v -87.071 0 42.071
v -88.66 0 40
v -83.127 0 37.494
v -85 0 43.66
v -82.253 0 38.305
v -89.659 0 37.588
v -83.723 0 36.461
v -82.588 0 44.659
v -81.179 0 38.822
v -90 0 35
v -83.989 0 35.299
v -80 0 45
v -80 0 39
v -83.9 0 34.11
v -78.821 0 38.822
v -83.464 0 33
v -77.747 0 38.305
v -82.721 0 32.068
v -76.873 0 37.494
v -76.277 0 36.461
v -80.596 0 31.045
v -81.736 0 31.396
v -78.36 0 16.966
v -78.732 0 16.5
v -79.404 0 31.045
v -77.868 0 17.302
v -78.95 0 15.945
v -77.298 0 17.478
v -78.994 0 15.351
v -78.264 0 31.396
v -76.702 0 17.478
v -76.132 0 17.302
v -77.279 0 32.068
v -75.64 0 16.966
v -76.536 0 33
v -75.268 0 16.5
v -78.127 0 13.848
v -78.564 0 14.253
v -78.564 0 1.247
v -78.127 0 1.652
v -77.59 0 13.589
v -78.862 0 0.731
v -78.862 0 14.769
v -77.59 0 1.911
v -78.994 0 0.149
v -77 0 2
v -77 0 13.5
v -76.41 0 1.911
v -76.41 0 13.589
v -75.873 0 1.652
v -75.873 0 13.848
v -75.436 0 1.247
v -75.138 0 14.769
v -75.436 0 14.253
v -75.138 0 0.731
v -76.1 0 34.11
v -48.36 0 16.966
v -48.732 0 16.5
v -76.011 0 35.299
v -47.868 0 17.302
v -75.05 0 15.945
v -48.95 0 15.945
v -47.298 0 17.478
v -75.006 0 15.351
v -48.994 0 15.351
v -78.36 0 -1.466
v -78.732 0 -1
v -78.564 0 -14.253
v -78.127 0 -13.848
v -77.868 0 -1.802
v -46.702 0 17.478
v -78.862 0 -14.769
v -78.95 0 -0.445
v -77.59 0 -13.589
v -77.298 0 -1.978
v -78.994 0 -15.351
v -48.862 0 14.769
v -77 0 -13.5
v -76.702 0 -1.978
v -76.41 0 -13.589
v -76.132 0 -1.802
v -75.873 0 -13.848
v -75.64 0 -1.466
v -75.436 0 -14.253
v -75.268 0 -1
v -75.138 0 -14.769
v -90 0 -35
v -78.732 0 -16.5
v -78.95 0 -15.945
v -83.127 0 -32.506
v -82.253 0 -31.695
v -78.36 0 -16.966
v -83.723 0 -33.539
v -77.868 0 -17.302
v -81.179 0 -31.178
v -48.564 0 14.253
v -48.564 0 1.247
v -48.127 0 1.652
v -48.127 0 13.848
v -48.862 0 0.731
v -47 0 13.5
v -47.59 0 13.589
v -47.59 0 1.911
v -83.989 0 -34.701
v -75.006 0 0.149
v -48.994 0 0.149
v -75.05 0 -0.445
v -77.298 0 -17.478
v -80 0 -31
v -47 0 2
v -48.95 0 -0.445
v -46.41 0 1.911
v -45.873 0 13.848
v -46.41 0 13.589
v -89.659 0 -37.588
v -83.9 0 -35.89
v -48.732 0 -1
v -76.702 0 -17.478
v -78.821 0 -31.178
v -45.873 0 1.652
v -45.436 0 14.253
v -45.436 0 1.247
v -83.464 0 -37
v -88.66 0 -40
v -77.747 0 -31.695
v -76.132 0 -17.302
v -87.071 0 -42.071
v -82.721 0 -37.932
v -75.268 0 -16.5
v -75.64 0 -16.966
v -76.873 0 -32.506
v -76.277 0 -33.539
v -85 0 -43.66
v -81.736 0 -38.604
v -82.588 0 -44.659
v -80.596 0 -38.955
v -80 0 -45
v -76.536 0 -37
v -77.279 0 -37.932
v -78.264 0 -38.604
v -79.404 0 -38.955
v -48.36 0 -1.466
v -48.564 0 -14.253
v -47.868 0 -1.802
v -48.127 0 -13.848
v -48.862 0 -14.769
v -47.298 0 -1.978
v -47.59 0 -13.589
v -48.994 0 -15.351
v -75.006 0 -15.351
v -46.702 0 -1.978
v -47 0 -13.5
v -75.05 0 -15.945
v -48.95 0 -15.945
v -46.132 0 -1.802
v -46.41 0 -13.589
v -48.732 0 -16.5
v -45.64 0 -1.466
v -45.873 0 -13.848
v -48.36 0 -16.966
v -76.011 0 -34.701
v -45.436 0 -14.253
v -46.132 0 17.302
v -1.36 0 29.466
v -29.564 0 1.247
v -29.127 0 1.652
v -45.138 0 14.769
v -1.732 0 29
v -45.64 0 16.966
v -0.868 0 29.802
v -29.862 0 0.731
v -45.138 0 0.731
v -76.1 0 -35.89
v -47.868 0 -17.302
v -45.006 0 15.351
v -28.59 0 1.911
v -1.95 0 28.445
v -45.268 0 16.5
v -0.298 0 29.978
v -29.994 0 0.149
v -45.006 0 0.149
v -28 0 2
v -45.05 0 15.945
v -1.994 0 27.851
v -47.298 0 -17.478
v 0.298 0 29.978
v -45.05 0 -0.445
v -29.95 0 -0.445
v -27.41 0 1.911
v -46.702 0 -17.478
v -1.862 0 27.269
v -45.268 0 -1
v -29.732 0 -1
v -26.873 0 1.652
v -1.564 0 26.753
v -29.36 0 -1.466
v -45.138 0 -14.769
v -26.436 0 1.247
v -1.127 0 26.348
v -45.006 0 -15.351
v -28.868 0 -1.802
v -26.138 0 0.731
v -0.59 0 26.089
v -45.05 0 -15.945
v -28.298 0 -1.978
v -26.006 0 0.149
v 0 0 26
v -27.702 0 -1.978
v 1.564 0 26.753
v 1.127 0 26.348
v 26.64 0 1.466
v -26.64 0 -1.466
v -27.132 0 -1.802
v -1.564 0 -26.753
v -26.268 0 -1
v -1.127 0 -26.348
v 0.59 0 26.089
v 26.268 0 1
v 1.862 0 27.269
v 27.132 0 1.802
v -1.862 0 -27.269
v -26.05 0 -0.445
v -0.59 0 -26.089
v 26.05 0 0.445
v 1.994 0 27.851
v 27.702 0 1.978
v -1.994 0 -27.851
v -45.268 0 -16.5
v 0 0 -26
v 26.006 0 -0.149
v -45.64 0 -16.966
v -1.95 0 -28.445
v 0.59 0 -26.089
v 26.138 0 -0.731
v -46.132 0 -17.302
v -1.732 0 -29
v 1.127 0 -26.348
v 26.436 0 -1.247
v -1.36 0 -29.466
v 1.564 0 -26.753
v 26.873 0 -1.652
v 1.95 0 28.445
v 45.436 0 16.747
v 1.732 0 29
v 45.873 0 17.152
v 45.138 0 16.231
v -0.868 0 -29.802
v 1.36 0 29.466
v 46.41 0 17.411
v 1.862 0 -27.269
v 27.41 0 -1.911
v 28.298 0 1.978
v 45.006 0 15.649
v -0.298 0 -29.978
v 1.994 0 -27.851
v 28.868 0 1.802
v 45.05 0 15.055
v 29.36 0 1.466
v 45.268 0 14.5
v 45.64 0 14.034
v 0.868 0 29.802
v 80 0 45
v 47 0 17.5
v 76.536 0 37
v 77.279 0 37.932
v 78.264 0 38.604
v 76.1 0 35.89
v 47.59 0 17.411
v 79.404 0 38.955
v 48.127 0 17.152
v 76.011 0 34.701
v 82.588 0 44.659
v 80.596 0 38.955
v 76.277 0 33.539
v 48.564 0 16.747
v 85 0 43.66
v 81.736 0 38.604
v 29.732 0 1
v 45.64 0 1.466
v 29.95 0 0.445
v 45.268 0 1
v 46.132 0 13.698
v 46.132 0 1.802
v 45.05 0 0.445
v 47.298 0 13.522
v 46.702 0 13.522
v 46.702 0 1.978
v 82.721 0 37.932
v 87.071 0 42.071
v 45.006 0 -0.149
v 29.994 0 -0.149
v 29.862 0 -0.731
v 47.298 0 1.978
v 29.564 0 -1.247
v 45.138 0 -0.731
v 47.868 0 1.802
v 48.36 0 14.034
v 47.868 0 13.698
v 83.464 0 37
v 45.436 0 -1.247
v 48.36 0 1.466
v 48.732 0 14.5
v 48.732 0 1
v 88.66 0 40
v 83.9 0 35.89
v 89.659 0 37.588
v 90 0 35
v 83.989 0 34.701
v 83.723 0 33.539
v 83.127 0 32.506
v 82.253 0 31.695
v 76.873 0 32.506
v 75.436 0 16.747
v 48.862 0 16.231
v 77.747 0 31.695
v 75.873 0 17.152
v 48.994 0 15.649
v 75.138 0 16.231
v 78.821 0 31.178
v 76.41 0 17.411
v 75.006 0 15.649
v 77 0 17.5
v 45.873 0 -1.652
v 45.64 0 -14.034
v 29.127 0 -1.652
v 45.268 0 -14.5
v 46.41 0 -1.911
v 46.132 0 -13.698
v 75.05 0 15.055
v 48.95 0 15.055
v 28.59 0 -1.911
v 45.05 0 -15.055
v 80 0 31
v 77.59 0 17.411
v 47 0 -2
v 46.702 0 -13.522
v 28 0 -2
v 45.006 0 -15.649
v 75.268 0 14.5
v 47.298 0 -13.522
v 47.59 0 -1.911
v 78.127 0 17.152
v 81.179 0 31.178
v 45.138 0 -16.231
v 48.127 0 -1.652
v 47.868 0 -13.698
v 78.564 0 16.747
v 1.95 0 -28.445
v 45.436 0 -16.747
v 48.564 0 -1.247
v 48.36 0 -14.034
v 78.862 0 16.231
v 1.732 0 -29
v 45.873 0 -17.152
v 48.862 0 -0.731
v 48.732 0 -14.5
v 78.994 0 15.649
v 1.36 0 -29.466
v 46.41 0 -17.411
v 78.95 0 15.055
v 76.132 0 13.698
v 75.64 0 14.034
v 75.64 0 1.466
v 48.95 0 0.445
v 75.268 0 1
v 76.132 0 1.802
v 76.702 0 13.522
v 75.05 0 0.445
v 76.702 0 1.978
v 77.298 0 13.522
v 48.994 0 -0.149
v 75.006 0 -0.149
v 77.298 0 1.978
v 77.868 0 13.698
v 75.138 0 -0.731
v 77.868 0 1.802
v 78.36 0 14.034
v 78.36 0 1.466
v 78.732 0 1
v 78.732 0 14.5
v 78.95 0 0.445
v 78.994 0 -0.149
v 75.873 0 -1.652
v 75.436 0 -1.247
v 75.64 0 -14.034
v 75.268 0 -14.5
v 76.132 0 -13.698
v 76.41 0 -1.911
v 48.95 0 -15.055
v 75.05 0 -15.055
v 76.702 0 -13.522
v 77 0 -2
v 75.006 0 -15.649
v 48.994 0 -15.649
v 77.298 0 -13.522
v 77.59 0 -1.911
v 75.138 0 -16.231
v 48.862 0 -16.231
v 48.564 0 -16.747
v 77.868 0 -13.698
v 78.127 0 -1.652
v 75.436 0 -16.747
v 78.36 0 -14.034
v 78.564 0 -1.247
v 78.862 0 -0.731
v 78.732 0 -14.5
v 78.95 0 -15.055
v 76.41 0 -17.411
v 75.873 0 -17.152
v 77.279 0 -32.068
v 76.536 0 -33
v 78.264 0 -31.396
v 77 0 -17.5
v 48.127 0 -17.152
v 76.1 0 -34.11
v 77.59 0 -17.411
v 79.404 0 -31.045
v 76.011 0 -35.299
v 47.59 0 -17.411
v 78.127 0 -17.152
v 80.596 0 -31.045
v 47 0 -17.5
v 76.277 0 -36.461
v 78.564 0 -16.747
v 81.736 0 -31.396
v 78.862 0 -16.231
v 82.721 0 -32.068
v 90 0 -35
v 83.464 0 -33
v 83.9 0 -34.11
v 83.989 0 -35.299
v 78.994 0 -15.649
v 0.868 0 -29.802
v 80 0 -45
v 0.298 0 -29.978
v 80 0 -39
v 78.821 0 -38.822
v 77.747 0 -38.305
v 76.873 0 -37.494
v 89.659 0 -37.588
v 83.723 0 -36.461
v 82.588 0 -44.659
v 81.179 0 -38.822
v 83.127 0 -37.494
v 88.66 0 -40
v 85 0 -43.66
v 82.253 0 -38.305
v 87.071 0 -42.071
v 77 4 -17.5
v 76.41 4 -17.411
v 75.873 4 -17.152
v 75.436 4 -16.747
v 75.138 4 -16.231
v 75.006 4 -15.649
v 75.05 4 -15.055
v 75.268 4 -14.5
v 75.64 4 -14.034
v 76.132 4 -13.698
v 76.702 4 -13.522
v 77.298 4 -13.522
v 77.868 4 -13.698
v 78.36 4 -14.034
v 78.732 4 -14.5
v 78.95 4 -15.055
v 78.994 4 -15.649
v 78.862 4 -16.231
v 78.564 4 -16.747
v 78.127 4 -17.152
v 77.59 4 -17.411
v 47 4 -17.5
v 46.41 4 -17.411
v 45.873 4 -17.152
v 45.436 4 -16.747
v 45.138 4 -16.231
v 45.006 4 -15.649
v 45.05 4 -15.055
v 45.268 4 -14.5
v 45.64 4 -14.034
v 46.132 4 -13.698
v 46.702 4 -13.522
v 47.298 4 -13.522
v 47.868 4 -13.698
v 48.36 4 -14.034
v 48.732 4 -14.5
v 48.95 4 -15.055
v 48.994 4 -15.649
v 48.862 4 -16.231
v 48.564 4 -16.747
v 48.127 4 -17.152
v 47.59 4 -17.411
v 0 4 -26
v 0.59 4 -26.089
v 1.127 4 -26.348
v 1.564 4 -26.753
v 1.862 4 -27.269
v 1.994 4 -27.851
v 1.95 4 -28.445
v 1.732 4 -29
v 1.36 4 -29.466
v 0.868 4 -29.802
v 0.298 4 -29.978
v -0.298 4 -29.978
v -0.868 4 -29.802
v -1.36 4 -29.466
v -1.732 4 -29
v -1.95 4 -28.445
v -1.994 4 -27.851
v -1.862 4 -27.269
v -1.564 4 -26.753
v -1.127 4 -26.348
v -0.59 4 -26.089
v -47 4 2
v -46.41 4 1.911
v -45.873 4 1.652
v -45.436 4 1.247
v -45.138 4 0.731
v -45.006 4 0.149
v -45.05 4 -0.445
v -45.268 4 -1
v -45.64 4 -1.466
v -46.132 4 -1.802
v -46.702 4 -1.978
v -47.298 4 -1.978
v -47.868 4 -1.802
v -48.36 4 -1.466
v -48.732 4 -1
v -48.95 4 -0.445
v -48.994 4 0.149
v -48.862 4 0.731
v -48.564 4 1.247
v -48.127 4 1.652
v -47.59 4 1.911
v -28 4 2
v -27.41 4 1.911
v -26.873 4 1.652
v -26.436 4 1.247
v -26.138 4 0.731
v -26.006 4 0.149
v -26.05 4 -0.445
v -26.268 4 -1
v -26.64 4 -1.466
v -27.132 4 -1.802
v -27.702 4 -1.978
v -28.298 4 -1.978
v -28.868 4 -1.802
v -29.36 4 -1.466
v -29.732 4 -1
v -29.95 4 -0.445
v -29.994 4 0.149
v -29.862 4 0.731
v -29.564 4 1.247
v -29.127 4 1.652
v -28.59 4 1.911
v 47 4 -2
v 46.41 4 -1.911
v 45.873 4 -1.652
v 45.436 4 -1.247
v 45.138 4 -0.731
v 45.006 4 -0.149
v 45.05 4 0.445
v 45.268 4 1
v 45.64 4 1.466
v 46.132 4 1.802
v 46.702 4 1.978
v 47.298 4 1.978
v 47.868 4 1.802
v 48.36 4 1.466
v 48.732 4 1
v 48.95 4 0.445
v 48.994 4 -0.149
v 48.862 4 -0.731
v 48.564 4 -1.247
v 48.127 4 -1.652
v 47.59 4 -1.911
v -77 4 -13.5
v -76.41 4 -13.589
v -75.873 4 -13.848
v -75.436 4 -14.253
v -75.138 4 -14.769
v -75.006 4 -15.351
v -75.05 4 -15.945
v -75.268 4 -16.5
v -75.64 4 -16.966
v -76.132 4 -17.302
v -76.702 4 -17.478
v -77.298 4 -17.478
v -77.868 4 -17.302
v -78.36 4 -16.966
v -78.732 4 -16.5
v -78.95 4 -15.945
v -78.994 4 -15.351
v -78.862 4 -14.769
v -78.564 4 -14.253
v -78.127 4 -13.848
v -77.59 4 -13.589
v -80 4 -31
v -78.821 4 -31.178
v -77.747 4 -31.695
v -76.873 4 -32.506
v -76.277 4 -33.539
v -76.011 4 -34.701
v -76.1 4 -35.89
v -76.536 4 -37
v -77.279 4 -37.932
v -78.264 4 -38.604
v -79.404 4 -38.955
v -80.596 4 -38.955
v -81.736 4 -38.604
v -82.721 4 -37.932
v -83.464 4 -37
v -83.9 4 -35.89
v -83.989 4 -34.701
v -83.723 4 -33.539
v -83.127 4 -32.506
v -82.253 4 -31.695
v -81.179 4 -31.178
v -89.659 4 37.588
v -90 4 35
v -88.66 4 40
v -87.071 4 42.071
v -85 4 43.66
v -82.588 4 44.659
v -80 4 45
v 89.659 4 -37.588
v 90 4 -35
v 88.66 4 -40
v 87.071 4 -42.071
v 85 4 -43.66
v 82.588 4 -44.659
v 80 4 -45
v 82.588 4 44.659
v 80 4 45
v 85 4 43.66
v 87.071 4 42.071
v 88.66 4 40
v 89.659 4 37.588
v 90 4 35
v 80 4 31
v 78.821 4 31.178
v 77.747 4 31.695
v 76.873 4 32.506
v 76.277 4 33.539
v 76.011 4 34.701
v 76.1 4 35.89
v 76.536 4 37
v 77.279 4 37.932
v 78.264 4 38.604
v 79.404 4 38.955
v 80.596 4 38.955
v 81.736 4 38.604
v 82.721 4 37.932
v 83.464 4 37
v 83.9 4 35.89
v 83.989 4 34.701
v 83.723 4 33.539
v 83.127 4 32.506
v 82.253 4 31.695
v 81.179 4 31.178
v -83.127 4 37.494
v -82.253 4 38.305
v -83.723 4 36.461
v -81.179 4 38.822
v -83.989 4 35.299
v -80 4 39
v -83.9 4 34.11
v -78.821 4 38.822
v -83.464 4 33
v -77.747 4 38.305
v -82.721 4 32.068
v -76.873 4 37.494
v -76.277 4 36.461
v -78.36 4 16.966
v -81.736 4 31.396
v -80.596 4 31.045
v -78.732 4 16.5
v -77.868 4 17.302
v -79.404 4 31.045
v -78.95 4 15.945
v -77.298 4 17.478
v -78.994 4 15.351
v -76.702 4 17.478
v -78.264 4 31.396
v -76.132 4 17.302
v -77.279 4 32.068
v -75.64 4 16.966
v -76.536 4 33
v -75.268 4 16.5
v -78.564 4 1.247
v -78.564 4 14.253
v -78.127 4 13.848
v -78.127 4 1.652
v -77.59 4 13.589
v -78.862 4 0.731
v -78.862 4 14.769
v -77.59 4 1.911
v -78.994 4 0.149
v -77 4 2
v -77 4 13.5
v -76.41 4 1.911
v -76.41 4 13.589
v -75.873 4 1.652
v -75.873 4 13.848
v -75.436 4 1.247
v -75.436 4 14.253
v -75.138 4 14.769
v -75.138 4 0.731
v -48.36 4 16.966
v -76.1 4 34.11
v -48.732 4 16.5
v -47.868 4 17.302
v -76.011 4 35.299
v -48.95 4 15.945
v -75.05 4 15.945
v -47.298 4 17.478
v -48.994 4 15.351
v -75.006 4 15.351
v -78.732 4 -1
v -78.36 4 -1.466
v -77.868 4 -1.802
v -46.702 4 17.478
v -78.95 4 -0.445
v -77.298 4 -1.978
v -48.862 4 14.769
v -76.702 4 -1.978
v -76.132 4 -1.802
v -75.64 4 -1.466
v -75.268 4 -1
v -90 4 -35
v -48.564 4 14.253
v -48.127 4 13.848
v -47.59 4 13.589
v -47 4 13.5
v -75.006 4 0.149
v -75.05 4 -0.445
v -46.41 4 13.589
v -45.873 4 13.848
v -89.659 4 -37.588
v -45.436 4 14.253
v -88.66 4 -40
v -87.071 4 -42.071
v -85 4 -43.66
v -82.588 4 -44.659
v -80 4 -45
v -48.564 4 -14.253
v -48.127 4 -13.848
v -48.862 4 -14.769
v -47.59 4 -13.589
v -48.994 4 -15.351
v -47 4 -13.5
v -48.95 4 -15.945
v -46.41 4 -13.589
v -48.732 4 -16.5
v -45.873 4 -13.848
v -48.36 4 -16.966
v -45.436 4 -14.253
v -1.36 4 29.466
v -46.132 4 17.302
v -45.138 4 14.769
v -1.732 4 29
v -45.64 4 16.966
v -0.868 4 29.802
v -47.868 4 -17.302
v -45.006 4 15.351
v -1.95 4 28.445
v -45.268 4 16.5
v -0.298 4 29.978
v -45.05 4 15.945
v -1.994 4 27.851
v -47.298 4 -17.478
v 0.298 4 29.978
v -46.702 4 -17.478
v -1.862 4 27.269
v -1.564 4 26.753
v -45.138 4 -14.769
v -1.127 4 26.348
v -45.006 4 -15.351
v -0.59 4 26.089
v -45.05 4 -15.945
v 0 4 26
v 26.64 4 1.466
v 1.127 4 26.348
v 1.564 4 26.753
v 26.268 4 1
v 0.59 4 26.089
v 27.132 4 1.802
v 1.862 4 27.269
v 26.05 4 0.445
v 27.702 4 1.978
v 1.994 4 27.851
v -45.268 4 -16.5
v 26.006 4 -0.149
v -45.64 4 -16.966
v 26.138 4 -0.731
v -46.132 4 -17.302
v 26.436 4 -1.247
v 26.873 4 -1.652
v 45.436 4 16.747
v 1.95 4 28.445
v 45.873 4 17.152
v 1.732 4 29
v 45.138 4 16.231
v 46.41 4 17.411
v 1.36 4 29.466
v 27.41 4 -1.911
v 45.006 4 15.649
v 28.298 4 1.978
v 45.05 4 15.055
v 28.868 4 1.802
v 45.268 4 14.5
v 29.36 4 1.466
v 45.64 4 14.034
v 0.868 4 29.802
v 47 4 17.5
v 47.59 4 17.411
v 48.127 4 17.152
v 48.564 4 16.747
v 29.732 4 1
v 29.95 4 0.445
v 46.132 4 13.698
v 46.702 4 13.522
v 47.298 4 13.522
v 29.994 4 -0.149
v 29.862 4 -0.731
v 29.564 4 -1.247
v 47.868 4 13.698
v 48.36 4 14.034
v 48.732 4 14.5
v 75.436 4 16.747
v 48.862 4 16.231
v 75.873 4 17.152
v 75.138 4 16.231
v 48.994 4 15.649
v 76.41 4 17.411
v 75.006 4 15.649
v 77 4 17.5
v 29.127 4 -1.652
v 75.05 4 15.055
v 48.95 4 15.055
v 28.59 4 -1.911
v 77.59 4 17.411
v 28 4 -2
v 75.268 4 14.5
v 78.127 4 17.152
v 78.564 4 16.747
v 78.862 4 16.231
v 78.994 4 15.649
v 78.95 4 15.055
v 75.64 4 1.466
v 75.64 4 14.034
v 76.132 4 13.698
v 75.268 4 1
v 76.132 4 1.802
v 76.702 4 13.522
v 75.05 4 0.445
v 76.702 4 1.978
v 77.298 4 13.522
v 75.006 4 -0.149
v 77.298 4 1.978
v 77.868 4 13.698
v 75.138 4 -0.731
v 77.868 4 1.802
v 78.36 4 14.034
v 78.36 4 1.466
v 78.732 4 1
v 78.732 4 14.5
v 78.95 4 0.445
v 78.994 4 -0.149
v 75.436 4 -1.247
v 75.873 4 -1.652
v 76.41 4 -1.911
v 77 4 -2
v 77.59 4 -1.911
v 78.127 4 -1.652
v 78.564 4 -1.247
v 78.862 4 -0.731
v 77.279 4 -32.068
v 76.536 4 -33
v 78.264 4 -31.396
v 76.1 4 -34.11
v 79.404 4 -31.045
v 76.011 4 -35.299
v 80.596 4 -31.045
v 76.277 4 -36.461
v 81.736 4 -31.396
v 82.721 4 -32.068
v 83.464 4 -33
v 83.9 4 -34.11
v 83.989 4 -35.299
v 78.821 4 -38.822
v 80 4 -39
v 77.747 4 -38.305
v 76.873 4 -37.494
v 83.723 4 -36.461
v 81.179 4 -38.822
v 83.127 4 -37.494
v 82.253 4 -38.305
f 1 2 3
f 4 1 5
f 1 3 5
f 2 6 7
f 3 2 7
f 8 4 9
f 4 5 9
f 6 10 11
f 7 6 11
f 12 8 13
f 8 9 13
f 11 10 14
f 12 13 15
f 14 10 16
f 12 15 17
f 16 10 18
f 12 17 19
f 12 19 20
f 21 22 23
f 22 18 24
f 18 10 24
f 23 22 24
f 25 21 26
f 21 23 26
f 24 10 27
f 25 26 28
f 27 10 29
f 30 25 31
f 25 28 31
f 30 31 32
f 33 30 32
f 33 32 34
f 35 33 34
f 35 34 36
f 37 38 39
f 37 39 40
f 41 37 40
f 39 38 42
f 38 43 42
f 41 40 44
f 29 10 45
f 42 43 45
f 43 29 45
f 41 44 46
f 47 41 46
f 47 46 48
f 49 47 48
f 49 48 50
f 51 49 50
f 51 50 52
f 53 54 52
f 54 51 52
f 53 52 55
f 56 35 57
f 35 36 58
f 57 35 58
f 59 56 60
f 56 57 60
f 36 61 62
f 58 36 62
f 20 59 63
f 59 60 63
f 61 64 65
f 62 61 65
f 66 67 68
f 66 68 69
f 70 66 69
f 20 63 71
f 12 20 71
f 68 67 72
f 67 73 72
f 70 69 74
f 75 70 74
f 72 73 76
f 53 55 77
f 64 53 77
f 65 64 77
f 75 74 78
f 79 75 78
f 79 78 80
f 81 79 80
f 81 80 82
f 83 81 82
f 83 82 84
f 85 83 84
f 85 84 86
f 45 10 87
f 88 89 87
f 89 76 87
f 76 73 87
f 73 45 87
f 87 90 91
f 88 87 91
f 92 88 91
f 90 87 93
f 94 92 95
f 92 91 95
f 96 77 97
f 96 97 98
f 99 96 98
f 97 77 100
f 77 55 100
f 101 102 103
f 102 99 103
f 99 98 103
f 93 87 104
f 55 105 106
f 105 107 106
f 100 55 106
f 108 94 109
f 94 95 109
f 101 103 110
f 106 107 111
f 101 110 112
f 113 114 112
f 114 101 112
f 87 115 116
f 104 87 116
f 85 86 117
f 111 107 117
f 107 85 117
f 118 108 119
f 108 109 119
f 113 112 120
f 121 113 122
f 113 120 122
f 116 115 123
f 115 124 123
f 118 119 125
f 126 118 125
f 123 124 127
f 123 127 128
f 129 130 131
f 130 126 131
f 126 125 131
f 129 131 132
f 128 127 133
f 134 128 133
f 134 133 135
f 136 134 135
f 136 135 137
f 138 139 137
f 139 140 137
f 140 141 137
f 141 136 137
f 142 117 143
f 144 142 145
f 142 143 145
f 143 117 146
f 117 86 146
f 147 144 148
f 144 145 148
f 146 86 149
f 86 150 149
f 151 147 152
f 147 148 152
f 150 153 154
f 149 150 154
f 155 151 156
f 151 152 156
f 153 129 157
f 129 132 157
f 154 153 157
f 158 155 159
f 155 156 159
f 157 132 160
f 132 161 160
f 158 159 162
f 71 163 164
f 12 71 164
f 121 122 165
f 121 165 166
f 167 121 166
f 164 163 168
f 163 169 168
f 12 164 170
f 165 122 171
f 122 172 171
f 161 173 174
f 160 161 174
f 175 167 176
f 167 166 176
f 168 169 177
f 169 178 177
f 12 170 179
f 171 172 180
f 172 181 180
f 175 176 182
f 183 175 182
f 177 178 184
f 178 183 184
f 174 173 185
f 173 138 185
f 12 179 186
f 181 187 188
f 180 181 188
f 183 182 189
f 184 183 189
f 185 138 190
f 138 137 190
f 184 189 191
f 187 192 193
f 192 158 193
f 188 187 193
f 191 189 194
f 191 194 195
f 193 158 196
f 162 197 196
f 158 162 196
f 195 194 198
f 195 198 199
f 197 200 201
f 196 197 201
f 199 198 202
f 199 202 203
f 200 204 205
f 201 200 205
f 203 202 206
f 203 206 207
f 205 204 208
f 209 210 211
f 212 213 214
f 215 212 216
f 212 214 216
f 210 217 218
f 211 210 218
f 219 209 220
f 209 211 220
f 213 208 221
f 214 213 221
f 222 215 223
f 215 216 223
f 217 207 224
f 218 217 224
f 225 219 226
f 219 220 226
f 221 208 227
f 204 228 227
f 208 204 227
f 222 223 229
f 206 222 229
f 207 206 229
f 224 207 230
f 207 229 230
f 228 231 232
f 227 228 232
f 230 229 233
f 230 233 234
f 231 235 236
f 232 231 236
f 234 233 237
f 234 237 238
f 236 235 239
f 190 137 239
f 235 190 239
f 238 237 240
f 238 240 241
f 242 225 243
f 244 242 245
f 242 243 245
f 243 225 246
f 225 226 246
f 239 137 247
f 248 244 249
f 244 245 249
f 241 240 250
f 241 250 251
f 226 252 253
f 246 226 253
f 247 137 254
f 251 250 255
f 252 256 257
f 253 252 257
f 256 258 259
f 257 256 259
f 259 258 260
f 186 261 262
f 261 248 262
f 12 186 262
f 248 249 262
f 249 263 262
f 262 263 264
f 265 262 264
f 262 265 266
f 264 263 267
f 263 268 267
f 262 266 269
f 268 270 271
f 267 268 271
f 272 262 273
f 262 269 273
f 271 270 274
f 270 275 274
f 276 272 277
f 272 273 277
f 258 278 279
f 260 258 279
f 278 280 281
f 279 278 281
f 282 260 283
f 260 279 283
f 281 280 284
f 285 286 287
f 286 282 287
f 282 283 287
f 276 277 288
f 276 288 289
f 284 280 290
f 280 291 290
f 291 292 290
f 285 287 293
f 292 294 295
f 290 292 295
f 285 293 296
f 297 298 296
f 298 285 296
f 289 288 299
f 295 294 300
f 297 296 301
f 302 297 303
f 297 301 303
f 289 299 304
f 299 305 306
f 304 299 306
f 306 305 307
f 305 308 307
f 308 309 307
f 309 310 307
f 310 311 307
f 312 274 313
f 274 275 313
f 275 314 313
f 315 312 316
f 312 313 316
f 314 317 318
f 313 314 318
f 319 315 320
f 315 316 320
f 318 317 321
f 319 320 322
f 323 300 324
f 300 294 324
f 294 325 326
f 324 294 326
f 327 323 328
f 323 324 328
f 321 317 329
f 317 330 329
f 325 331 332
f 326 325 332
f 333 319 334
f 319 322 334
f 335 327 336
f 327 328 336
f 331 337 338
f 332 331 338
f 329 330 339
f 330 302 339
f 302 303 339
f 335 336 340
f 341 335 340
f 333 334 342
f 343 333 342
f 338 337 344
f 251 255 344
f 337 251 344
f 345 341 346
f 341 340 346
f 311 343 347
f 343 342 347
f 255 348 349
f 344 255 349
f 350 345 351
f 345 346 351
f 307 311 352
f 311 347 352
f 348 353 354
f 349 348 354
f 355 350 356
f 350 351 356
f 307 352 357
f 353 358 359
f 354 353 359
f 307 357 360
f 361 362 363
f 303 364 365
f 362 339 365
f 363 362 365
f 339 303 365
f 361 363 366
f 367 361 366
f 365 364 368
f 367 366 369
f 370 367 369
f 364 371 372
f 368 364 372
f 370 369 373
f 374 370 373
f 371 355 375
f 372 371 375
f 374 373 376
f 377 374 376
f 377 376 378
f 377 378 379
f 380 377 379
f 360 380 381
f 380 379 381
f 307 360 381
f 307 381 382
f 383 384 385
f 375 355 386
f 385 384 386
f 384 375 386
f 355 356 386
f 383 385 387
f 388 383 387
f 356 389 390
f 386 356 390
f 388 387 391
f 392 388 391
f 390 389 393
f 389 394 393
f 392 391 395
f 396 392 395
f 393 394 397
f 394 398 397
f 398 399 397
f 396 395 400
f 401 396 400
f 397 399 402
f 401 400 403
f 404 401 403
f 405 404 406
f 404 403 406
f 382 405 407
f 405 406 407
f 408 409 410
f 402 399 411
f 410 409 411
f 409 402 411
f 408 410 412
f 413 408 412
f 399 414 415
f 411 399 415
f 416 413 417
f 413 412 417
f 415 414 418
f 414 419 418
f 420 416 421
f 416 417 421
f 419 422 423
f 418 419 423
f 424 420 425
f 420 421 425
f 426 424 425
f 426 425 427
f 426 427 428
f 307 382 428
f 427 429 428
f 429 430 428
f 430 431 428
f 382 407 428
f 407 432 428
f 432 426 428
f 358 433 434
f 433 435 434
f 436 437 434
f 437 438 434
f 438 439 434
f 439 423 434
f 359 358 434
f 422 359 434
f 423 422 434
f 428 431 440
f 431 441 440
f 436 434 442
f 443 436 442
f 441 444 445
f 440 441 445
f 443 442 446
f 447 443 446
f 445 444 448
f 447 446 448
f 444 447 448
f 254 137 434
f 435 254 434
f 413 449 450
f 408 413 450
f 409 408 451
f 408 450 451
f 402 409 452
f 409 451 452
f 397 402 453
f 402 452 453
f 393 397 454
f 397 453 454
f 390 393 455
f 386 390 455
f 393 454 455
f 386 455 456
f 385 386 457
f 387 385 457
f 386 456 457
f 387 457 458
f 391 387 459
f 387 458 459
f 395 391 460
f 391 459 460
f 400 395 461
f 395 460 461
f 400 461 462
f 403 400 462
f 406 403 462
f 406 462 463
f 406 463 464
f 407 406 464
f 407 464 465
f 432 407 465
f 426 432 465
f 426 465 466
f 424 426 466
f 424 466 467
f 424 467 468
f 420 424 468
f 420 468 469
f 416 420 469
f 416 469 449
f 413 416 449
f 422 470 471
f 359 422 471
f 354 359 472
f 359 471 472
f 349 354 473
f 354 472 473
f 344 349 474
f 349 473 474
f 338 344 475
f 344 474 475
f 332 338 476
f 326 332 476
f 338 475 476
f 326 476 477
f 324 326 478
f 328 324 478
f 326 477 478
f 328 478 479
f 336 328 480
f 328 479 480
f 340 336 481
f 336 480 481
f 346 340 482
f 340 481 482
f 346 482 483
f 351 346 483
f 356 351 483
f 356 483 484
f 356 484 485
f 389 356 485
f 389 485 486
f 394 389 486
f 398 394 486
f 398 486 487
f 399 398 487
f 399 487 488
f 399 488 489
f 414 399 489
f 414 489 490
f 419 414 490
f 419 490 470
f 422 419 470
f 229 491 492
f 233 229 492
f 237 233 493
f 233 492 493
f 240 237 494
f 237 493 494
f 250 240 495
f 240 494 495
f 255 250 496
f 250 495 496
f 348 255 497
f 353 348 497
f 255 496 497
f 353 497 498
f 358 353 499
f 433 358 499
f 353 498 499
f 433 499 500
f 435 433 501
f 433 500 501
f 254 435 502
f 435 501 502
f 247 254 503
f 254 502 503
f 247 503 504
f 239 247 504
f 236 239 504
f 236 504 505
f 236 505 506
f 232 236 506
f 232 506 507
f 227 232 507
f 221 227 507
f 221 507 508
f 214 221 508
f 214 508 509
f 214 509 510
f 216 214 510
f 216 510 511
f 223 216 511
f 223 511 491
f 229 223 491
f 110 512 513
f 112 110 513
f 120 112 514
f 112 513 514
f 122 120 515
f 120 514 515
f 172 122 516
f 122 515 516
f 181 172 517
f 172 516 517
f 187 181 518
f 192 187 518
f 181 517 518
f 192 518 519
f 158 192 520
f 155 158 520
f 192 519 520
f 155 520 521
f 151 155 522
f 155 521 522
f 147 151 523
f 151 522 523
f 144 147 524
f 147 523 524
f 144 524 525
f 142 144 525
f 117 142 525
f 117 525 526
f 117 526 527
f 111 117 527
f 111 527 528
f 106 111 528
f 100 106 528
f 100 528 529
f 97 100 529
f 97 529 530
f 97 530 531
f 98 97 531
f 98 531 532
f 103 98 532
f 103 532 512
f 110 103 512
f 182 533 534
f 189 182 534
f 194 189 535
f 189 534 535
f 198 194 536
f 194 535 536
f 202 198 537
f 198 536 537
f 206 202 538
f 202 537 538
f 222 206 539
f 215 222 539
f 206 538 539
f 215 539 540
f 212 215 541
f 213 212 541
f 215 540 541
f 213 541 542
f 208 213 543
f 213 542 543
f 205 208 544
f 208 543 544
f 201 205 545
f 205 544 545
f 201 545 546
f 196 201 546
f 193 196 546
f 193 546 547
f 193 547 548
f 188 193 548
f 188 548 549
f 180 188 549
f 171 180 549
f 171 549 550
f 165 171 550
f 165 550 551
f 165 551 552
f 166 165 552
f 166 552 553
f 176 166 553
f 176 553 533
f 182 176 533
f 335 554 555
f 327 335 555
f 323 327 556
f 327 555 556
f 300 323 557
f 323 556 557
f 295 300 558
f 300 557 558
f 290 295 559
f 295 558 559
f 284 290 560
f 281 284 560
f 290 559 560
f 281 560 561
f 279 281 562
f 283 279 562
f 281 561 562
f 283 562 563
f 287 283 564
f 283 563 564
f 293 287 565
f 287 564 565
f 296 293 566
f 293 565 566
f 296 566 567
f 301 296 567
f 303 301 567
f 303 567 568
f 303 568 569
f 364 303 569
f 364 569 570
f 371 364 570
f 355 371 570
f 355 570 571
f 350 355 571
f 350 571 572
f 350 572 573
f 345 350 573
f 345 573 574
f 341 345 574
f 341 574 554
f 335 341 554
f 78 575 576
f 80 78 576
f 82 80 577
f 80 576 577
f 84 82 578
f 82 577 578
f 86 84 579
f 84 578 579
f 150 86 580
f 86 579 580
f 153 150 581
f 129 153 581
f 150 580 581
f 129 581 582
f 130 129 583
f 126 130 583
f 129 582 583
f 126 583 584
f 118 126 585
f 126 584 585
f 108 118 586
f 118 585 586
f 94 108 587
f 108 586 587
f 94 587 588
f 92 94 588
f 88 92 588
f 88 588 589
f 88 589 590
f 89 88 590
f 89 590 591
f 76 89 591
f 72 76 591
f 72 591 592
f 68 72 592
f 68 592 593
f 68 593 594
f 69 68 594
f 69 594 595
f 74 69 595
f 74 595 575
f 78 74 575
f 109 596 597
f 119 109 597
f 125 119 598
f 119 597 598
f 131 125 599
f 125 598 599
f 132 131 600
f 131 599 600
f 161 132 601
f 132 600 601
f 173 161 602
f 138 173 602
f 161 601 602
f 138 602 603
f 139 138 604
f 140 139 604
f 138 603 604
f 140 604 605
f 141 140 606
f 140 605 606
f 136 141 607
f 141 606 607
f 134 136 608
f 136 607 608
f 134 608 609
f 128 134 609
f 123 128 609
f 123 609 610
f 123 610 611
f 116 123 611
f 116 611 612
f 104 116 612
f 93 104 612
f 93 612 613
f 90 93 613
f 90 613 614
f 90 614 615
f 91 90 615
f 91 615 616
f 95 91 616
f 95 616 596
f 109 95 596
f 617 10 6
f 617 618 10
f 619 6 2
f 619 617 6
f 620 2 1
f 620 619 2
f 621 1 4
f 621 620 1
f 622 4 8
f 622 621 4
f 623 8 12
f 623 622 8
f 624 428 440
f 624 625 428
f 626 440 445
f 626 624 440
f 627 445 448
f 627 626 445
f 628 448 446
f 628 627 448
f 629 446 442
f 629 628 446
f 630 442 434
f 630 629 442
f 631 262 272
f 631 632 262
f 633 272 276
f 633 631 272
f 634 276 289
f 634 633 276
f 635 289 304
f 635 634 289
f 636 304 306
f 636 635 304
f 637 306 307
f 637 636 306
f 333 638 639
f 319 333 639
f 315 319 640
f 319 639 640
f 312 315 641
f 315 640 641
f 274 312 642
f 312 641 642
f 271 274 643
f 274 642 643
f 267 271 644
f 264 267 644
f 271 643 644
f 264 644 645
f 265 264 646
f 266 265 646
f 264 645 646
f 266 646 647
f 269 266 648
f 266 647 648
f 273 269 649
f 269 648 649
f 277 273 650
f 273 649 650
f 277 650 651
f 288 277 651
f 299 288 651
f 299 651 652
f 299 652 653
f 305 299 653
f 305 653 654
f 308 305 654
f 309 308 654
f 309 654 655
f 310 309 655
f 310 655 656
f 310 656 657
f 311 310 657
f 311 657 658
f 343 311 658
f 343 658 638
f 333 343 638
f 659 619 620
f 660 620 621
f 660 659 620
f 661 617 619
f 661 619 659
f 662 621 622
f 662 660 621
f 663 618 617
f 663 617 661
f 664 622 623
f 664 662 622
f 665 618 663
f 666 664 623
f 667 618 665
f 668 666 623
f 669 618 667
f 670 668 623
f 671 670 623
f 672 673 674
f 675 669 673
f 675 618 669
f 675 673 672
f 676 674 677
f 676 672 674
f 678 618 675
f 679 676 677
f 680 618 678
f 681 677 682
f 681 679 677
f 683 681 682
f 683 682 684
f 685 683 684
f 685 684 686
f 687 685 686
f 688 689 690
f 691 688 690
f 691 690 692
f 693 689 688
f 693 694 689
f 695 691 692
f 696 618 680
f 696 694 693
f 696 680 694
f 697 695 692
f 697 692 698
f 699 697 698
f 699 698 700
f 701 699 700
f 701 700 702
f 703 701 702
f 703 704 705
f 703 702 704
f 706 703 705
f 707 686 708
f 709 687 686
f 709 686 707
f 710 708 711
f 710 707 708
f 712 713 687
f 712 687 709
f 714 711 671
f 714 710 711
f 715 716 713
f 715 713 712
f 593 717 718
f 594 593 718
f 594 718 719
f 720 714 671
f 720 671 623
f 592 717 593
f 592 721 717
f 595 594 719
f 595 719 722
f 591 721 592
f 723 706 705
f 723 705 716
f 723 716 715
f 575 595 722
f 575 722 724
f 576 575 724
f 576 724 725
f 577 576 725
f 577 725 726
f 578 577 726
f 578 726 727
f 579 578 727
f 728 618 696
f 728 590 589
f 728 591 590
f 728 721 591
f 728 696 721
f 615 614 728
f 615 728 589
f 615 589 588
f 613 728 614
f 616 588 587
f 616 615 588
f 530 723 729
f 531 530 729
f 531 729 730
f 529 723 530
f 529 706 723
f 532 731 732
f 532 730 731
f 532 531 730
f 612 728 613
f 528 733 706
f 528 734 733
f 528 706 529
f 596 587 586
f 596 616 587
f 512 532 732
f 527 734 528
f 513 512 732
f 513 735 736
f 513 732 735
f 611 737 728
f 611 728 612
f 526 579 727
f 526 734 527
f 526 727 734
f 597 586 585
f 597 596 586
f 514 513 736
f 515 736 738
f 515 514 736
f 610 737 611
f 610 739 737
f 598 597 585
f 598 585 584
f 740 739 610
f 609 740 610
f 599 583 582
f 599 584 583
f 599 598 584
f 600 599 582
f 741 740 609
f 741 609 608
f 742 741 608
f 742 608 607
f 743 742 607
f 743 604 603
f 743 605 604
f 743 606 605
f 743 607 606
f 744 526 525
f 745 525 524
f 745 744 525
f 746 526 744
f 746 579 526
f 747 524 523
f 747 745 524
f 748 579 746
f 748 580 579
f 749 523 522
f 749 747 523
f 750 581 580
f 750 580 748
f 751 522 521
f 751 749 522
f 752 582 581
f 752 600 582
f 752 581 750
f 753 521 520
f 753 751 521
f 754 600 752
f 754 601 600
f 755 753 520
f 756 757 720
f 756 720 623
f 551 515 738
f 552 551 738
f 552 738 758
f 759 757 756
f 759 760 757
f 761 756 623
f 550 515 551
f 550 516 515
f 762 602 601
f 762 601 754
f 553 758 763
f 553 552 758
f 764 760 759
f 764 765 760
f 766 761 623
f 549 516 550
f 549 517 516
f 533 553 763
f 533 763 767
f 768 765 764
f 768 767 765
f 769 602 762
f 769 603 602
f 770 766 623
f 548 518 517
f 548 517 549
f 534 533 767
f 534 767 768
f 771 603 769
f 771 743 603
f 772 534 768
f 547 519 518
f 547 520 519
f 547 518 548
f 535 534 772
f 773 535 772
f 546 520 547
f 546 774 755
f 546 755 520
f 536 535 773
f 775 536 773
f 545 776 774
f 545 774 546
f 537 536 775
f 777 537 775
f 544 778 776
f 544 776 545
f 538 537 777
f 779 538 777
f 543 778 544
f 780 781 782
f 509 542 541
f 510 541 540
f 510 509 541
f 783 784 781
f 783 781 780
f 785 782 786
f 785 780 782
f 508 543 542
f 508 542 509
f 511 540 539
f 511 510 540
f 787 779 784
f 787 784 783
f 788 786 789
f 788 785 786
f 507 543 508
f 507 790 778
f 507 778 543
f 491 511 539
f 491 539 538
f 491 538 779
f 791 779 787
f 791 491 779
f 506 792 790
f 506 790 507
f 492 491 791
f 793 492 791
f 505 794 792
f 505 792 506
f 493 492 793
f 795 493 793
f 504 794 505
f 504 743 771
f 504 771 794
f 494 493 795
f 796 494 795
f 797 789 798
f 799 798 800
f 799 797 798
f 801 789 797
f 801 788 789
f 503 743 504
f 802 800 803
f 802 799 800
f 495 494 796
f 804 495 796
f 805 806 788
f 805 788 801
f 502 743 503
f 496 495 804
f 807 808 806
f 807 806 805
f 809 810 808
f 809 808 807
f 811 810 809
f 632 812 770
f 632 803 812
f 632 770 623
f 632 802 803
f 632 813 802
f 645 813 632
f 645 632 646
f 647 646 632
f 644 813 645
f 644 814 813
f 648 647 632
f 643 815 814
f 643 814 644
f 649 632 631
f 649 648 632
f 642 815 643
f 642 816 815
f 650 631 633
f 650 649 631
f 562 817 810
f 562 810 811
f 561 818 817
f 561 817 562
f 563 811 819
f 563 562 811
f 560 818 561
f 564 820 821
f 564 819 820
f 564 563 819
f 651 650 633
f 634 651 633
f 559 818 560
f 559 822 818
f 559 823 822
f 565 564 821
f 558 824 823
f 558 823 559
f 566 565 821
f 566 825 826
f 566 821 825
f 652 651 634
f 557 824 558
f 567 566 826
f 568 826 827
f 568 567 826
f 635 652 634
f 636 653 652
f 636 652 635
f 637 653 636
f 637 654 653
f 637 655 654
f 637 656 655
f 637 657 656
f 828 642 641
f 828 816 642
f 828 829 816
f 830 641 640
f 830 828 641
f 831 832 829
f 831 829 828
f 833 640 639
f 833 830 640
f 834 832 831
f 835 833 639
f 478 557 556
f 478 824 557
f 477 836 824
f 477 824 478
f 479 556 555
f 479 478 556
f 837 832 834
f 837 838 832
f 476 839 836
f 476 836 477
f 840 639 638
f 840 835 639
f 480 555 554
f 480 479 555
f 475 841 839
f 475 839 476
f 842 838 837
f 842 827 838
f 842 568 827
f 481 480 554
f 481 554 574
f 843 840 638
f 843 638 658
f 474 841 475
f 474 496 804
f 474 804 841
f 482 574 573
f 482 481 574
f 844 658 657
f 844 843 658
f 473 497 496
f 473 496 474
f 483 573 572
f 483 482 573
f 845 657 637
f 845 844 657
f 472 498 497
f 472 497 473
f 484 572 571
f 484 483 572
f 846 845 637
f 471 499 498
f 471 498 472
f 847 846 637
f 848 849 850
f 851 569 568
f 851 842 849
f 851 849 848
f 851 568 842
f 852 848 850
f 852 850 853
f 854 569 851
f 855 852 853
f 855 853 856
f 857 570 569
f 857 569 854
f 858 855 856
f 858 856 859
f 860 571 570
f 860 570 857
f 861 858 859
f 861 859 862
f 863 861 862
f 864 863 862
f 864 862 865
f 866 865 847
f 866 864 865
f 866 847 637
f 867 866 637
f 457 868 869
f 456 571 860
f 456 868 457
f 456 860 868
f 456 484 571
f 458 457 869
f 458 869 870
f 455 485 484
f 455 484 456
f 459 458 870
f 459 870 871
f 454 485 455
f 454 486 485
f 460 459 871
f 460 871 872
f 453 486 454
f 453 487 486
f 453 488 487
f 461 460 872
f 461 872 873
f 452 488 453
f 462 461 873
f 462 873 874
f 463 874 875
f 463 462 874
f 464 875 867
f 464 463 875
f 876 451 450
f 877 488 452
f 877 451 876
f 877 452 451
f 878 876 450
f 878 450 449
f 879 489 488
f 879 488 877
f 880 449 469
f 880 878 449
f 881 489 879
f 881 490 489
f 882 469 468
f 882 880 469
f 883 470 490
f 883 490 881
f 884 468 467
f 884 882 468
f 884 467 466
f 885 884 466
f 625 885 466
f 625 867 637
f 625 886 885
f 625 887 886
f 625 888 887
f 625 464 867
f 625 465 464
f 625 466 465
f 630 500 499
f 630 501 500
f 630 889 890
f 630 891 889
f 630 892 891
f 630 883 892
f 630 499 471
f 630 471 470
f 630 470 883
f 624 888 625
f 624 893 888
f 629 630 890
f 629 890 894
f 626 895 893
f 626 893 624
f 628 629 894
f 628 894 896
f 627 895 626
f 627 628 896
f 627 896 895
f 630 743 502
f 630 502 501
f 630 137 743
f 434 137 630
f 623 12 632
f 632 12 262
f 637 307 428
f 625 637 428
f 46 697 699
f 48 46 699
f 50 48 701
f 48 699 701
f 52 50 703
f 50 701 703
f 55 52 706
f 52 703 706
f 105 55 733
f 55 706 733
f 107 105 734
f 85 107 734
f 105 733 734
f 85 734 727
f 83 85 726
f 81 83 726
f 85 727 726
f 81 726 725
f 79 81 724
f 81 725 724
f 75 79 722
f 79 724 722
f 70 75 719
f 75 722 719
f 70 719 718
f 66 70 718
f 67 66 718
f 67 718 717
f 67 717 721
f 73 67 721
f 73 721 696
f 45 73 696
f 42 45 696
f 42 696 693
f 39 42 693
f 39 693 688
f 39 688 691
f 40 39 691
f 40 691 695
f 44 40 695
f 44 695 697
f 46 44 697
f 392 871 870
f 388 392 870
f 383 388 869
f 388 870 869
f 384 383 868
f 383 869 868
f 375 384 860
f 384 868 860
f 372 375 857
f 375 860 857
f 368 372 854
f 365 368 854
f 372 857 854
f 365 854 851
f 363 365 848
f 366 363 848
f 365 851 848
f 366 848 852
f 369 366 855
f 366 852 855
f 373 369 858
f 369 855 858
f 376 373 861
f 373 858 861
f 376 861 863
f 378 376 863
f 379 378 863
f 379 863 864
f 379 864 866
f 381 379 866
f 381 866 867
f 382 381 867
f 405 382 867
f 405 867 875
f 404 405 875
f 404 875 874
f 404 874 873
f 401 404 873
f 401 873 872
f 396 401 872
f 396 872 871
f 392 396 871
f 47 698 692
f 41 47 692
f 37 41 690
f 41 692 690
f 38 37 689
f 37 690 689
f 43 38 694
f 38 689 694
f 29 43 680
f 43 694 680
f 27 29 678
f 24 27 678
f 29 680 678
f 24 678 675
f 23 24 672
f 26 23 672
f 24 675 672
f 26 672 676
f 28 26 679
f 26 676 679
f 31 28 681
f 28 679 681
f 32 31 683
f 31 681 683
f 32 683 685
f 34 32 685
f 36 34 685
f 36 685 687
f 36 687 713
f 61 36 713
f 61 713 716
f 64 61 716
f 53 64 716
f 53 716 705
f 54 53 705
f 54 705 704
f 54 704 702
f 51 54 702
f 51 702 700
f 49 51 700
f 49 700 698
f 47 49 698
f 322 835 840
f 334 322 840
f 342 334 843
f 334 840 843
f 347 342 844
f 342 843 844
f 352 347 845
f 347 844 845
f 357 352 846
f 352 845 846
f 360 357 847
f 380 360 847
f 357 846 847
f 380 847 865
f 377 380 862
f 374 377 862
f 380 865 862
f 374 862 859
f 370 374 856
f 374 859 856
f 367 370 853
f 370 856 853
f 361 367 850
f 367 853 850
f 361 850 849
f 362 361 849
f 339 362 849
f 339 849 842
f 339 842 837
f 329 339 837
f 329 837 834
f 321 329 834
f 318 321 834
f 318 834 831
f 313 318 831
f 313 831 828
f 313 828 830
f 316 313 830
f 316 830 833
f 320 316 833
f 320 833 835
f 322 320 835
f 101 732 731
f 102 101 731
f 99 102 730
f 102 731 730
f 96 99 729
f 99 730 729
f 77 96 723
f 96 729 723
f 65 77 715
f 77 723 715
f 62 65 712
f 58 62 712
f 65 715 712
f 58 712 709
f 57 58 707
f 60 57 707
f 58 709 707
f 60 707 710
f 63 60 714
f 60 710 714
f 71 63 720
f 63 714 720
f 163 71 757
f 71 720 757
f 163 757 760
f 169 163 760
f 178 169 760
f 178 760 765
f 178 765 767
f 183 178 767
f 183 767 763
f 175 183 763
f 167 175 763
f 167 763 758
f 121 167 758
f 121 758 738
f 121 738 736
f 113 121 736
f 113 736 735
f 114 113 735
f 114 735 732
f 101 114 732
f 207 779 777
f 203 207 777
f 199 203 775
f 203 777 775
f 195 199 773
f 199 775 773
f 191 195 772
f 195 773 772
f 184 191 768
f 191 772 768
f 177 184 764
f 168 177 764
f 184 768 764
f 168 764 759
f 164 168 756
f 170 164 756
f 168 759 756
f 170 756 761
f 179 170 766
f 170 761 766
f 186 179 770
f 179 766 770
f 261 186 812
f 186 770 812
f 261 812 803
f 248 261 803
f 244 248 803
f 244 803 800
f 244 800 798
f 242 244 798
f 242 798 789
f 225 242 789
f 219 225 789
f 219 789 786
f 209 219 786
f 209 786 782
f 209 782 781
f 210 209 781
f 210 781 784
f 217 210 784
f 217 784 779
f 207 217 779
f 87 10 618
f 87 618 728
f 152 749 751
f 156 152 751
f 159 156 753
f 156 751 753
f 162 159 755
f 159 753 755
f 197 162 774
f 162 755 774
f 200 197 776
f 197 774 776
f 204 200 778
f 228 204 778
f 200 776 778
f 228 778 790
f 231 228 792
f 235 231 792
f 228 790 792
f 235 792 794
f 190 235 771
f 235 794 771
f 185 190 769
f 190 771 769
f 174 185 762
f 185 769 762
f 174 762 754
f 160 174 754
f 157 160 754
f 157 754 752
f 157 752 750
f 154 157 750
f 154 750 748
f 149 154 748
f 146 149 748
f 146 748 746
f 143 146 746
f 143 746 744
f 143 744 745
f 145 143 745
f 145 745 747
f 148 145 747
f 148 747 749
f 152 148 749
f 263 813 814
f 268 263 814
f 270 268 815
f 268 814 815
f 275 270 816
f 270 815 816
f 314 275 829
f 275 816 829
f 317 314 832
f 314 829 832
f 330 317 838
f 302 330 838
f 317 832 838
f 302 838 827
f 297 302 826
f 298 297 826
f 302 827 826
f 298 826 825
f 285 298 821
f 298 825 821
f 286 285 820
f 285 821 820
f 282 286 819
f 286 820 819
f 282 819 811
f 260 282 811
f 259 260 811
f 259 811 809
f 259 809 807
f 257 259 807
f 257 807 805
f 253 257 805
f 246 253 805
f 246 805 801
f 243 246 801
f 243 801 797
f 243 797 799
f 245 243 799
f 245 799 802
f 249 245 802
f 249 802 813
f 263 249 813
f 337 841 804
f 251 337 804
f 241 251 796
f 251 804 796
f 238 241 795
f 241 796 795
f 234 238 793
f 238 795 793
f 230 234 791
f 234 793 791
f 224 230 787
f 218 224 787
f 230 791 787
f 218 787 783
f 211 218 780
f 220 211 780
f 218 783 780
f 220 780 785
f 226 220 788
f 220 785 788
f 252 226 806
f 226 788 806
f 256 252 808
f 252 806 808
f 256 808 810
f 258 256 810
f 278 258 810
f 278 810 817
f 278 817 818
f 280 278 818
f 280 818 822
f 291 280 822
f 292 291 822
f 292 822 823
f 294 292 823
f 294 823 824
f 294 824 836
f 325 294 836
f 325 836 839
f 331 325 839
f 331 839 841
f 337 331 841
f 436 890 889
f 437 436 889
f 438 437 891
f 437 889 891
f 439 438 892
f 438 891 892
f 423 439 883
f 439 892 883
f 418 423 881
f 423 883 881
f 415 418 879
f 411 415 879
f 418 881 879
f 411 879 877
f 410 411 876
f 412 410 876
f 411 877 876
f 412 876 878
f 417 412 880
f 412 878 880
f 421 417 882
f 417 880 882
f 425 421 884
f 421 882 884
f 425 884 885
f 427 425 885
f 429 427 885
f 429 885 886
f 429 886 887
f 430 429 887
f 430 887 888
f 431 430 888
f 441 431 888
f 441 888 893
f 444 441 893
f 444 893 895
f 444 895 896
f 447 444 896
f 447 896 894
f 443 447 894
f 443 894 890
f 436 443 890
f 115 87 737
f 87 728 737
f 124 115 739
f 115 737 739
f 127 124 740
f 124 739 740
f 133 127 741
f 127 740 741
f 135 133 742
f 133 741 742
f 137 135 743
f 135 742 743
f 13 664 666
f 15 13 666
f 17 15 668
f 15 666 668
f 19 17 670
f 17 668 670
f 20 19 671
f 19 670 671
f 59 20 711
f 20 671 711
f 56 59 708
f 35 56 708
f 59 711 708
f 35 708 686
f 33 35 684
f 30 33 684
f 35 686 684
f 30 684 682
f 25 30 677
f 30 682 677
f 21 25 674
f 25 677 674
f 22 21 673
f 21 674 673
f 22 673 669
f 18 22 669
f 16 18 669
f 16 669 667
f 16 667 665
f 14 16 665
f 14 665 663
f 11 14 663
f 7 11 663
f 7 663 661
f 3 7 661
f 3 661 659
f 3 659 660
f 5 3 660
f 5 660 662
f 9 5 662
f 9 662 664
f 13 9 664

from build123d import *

# Parameters (mm, degrees)
CROQUIS2_W              = 180
CROQUIS2_H              = 90
SALIENTE_EXTRUIR1_DEPTH = 4
REDONDEO1_R             = 10
CORTAR_EXTRUIR1_REACH   = 102.703
CROQUIS8_R              = 2
CORTAR_EXTRUIR2_REACH   = 102.703
CROQUIS4_R              = 4
CROQUIS9_R              = 2
CORTAR_EXTRUIR3_DEPTH   = 101.702532242


with BuildPart() as part:
    # Croquis2 → Saliente-Extruir1 (new body)
    with BuildSketch(Plane(origin=(0, 0, 0), x_dir=(1, 0, 0), z_dir=(0, 1, 0))):
        Rectangle(CROQUIS2_W, CROQUIS2_H)
    extrude(amount=SALIENTE_EXTRUIR1_DEPTH)

    # Redondeo1
    redondeo1_edges = [part.edges().sort_by_distance(p)[0] for p in [
        (90, 2, 45),
        (-90, 2, 45),
        (-90, 2, -45),
        (90, 2, -45),
    ]]
    fillet(redondeo1_edges, radius=REDONDEO1_R)

    # Croquis8 → Cortar-Extruir1 (cut, up to next)
    with BuildSketch(Plane(origin=(0, 4, 0), x_dir=(1, 0, 0), z_dir=(0, 1, 0)), mode=Mode.PRIVATE) as cortar_extruir1_sk1:
        with Locations(Location((-47, 0, 0), (0, 0, 270))):
            Circle(CROQUIS8_R)
    cortar_extruir1_tool1 = extrude(cortar_extruir1_sk1.sketch, amount=-CORTAR_EXTRUIR1_REACH, mode=Mode.PRIVATE) & part.part
    # Croquis8 → Cortar-Extruir1 (cut, up to next)
    with BuildSketch(Plane(origin=(0, 4, 0), x_dir=(1, 0, 0), z_dir=(0, 1, 0)), mode=Mode.PRIVATE) as cortar_extruir1_sk2:
        with Locations(Location((-77, 0, 0), (0, 0, 270))):
            Circle(CROQUIS8_R)
    cortar_extruir1_tool2 = extrude(cortar_extruir1_sk2.sketch, amount=-CORTAR_EXTRUIR1_REACH, mode=Mode.PRIVATE) & part.part
    # Croquis8 → Cortar-Extruir1 (cut, up to next)
    with BuildSketch(Plane(origin=(0, 4, 0), x_dir=(1, 0, 0), z_dir=(0, 1, 0)), mode=Mode.PRIVATE) as cortar_extruir1_sk3:
        with Locations(Location((77, 0, 0), (0, 0, 90))):
            Circle(CROQUIS8_R)
    cortar_extruir1_tool3 = extrude(cortar_extruir1_sk3.sketch, amount=-CORTAR_EXTRUIR1_REACH, mode=Mode.PRIVATE) & part.part
    # Croquis8 → Cortar-Extruir1 (cut, up to next)
    with BuildSketch(Plane(origin=(0, 4, 0), x_dir=(1, 0, 0), z_dir=(0, 1, 0)), mode=Mode.PRIVATE) as cortar_extruir1_sk4:
        with Locations(Location((47, 0, 0), (0, 0, 90))):
            Circle(CROQUIS8_R)
    cortar_extruir1_tool4 = extrude(cortar_extruir1_sk4.sketch, amount=-CORTAR_EXTRUIR1_REACH, mode=Mode.PRIVATE) & part.part
    # Croquis8 → Cortar-Extruir1 (cut, up to next)
    with BuildSketch(Plane(origin=(0, 4, 0), x_dir=(1, 0, 0), z_dir=(0, 1, 0)), mode=Mode.PRIVATE) as cortar_extruir1_sk5:
        with Locations(Location((-77, 15.5, 0), (0, 0, 270))):
            Circle(CROQUIS8_R)
    cortar_extruir1_tool5 = extrude(cortar_extruir1_sk5.sketch, amount=-CORTAR_EXTRUIR1_REACH, mode=Mode.PRIVATE) & part.part
    # Croquis8 → Cortar-Extruir1 (cut, up to next)
    with BuildSketch(Plane(origin=(0, 4, 0), x_dir=(1, 0, 0), z_dir=(0, 1, 0)), mode=Mode.PRIVATE) as cortar_extruir1_sk6:
        with Locations(Location((-47, 15.5, 0), (0, 0, 270))):
            Circle(CROQUIS8_R)
    cortar_extruir1_tool6 = extrude(cortar_extruir1_sk6.sketch, amount=-CORTAR_EXTRUIR1_REACH, mode=Mode.PRIVATE) & part.part
    # Croquis8 → Cortar-Extruir1 (cut, up to next)
    with BuildSketch(Plane(origin=(0, 4, 0), x_dir=(1, 0, 0), z_dir=(0, 1, 0)), mode=Mode.PRIVATE) as cortar_extruir1_sk7:
        with Locations(Location((-77, -15.5, 0), (0, 0, 90))):
            Circle(CROQUIS8_R)
    cortar_extruir1_tool7 = extrude(cortar_extruir1_sk7.sketch, amount=-CORTAR_EXTRUIR1_REACH, mode=Mode.PRIVATE) & part.part
    # Croquis8 → Cortar-Extruir1 (cut, up to next)
    with BuildSketch(Plane(origin=(0, 4, 0), x_dir=(1, 0, 0), z_dir=(0, 1, 0)), mode=Mode.PRIVATE) as cortar_extruir1_sk8:
        with Locations(Location((-47, -15.5, 0), (0, 0, 90))):
            Circle(CROQUIS8_R)
    cortar_extruir1_tool8 = extrude(cortar_extruir1_sk8.sketch, amount=-CORTAR_EXTRUIR1_REACH, mode=Mode.PRIVATE) & part.part
    # Croquis8 → Cortar-Extruir1 (cut, up to next)
    with BuildSketch(Plane(origin=(0, 4, 0), x_dir=(1, 0, 0), z_dir=(0, 1, 0)), mode=Mode.PRIVATE) as cortar_extruir1_sk9:
        with Locations(Location((47, -15.5, 0), (0, 0, 270))):
            Circle(CROQUIS8_R)
    cortar_extruir1_tool9 = extrude(cortar_extruir1_sk9.sketch, amount=-CORTAR_EXTRUIR1_REACH, mode=Mode.PRIVATE) & part.part
    # Croquis8 → Cortar-Extruir1 (cut, up to next)
    with BuildSketch(Plane(origin=(0, 4, 0), x_dir=(1, 0, 0), z_dir=(0, 1, 0)), mode=Mode.PRIVATE) as cortar_extruir1_sk10:
        with Locations(Location((77, -15.5, 0), (0, 0, 270))):
            Circle(CROQUIS8_R)
    cortar_extruir1_tool10 = extrude(cortar_extruir1_sk10.sketch, amount=-CORTAR_EXTRUIR1_REACH, mode=Mode.PRIVATE) & part.part
    # Croquis8 → Cortar-Extruir1 (cut, up to next)
    with BuildSketch(Plane(origin=(0, 4, 0), x_dir=(1, 0, 0), z_dir=(0, 1, 0)), mode=Mode.PRIVATE) as cortar_extruir1_sk11:
        with Locations(Location((77, 15.5, 0), (0, 0, 90))):
            Circle(CROQUIS8_R)
    cortar_extruir1_tool11 = extrude(cortar_extruir1_sk11.sketch, amount=-CORTAR_EXTRUIR1_REACH, mode=Mode.PRIVATE) & part.part
    # Croquis8 → Cortar-Extruir1 (cut, up to next)
    with BuildSketch(Plane(origin=(0, 4, 0), x_dir=(1, 0, 0), z_dir=(0, 1, 0)), mode=Mode.PRIVATE) as cortar_extruir1_sk12:
        with Locations(Location((47, 15.5, 0), (0, 0, 90))):
            Circle(CROQUIS8_R)
    cortar_extruir1_tool12 = extrude(cortar_extruir1_sk12.sketch, amount=-CORTAR_EXTRUIR1_REACH, mode=Mode.PRIVATE) & part.part
    add(cortar_extruir1_tool1.solids().sort_by_distance((-47, 4, 0))[0], mode=Mode.SUBTRACT)
    add(cortar_extruir1_tool2.solids().sort_by_distance((-77, 4, 0))[0], mode=Mode.SUBTRACT)
    add(cortar_extruir1_tool3.solids().sort_by_distance((77, 4, 0))[0], mode=Mode.SUBTRACT)
    add(cortar_extruir1_tool4.solids().sort_by_distance((47, 4, 0))[0], mode=Mode.SUBTRACT)
    add(cortar_extruir1_tool5.solids().sort_by_distance((-77, 4, -15.5))[0], mode=Mode.SUBTRACT)
    add(cortar_extruir1_tool6.solids().sort_by_distance((-47, 4, -15.5))[0], mode=Mode.SUBTRACT)
    add(cortar_extruir1_tool7.solids().sort_by_distance((-77, 4, 15.5))[0], mode=Mode.SUBTRACT)
    add(cortar_extruir1_tool8.solids().sort_by_distance((-47, 4, 15.5))[0], mode=Mode.SUBTRACT)
    add(cortar_extruir1_tool9.solids().sort_by_distance((47, 4, 15.5))[0], mode=Mode.SUBTRACT)
    add(cortar_extruir1_tool10.solids().sort_by_distance((77, 4, 15.5))[0], mode=Mode.SUBTRACT)
    add(cortar_extruir1_tool11.solids().sort_by_distance((77, 4, -15.5))[0], mode=Mode.SUBTRACT)
    add(cortar_extruir1_tool12.solids().sort_by_distance((47, 4, -15.5))[0], mode=Mode.SUBTRACT)

    # Croquis4 → Cortar-Extruir2 (cut, up to next)
    with BuildSketch(Plane(origin=(0, 4, 0), x_dir=(1, 0, 0), z_dir=(0, 1, 0)), mode=Mode.PRIVATE) as cortar_extruir2_sk1:
        with Locations(Location((-80, 35, 0), (0, 0, 270))):
            Circle(CROQUIS4_R)
    cortar_extruir2_tool1 = extrude(cortar_extruir2_sk1.sketch, amount=-CORTAR_EXTRUIR2_REACH, mode=Mode.PRIVATE) & part.part
    # Croquis4 → Cortar-Extruir2 (cut, up to next)
    with BuildSketch(Plane(origin=(0, 4, 0), x_dir=(1, 0, 0), z_dir=(0, 1, 0)), mode=Mode.PRIVATE) as cortar_extruir2_sk2:
        with Locations(Location((-80, -35, 0), (0, 0, 270))):
            Circle(CROQUIS4_R)
    cortar_extruir2_tool2 = extrude(cortar_extruir2_sk2.sketch, amount=-CORTAR_EXTRUIR2_REACH, mode=Mode.PRIVATE) & part.part
    # Croquis4 → Cortar-Extruir2 (cut, up to next)
    with BuildSketch(Plane(origin=(0, 4, 0), x_dir=(1, 0, 0), z_dir=(0, 1, 0)), mode=Mode.PRIVATE) as cortar_extruir2_sk3:
        with Locations(Location((80, -35, 0), (0, 0, 90))):
            Circle(CROQUIS4_R)
    cortar_extruir2_tool3 = extrude(cortar_extruir2_sk3.sketch, amount=-CORTAR_EXTRUIR2_REACH, mode=Mode.PRIVATE) & part.part
    # Croquis4 → Cortar-Extruir2 (cut, up to next)
    with BuildSketch(Plane(origin=(0, 4, 0), x_dir=(1, 0, 0), z_dir=(0, 1, 0)), mode=Mode.PRIVATE) as cortar_extruir2_sk4:
        with Locations(Location((80, 35, 0), (0, 0, 90))):
            Circle(CROQUIS4_R)
    cortar_extruir2_tool4 = extrude(cortar_extruir2_sk4.sketch, amount=-CORTAR_EXTRUIR2_REACH, mode=Mode.PRIVATE) & part.part
    add(cortar_extruir2_tool1.solids().sort_by_distance((-80, 4, -35))[0], mode=Mode.SUBTRACT)
    add(cortar_extruir2_tool2.solids().sort_by_distance((-80, 4, 35))[0], mode=Mode.SUBTRACT)
    add(cortar_extruir2_tool3.solids().sort_by_distance((80, 4, 35))[0], mode=Mode.SUBTRACT)
    add(cortar_extruir2_tool4.solids().sort_by_distance((80, 4, -35))[0], mode=Mode.SUBTRACT)

    # Croquis9 → Cortar-Extruir3 (cut, through all)
    with BuildSketch(Plane(origin=(0, 4, 0), x_dir=(1, 0, 0), z_dir=(0, 1, 0))):
        with Locations(Location((0, 28, 0), (0, 0, 270))):
            Circle(CROQUIS9_R)
        with Locations(Location((-28, 0, 0), (0, 0, 270))):
            Circle(CROQUIS9_R)
        with Locations(Location((0, -28, 0), (0, 0, 90))):
            Circle(CROQUIS9_R)
        with Locations(Location((28, 0, 0), (0, 0, 90))):
            Circle(CROQUIS9_R)
    extrude(amount=-CORTAR_EXTRUIR3_DEPTH, mode=Mode.SUBTRACT)


solid = part.part
